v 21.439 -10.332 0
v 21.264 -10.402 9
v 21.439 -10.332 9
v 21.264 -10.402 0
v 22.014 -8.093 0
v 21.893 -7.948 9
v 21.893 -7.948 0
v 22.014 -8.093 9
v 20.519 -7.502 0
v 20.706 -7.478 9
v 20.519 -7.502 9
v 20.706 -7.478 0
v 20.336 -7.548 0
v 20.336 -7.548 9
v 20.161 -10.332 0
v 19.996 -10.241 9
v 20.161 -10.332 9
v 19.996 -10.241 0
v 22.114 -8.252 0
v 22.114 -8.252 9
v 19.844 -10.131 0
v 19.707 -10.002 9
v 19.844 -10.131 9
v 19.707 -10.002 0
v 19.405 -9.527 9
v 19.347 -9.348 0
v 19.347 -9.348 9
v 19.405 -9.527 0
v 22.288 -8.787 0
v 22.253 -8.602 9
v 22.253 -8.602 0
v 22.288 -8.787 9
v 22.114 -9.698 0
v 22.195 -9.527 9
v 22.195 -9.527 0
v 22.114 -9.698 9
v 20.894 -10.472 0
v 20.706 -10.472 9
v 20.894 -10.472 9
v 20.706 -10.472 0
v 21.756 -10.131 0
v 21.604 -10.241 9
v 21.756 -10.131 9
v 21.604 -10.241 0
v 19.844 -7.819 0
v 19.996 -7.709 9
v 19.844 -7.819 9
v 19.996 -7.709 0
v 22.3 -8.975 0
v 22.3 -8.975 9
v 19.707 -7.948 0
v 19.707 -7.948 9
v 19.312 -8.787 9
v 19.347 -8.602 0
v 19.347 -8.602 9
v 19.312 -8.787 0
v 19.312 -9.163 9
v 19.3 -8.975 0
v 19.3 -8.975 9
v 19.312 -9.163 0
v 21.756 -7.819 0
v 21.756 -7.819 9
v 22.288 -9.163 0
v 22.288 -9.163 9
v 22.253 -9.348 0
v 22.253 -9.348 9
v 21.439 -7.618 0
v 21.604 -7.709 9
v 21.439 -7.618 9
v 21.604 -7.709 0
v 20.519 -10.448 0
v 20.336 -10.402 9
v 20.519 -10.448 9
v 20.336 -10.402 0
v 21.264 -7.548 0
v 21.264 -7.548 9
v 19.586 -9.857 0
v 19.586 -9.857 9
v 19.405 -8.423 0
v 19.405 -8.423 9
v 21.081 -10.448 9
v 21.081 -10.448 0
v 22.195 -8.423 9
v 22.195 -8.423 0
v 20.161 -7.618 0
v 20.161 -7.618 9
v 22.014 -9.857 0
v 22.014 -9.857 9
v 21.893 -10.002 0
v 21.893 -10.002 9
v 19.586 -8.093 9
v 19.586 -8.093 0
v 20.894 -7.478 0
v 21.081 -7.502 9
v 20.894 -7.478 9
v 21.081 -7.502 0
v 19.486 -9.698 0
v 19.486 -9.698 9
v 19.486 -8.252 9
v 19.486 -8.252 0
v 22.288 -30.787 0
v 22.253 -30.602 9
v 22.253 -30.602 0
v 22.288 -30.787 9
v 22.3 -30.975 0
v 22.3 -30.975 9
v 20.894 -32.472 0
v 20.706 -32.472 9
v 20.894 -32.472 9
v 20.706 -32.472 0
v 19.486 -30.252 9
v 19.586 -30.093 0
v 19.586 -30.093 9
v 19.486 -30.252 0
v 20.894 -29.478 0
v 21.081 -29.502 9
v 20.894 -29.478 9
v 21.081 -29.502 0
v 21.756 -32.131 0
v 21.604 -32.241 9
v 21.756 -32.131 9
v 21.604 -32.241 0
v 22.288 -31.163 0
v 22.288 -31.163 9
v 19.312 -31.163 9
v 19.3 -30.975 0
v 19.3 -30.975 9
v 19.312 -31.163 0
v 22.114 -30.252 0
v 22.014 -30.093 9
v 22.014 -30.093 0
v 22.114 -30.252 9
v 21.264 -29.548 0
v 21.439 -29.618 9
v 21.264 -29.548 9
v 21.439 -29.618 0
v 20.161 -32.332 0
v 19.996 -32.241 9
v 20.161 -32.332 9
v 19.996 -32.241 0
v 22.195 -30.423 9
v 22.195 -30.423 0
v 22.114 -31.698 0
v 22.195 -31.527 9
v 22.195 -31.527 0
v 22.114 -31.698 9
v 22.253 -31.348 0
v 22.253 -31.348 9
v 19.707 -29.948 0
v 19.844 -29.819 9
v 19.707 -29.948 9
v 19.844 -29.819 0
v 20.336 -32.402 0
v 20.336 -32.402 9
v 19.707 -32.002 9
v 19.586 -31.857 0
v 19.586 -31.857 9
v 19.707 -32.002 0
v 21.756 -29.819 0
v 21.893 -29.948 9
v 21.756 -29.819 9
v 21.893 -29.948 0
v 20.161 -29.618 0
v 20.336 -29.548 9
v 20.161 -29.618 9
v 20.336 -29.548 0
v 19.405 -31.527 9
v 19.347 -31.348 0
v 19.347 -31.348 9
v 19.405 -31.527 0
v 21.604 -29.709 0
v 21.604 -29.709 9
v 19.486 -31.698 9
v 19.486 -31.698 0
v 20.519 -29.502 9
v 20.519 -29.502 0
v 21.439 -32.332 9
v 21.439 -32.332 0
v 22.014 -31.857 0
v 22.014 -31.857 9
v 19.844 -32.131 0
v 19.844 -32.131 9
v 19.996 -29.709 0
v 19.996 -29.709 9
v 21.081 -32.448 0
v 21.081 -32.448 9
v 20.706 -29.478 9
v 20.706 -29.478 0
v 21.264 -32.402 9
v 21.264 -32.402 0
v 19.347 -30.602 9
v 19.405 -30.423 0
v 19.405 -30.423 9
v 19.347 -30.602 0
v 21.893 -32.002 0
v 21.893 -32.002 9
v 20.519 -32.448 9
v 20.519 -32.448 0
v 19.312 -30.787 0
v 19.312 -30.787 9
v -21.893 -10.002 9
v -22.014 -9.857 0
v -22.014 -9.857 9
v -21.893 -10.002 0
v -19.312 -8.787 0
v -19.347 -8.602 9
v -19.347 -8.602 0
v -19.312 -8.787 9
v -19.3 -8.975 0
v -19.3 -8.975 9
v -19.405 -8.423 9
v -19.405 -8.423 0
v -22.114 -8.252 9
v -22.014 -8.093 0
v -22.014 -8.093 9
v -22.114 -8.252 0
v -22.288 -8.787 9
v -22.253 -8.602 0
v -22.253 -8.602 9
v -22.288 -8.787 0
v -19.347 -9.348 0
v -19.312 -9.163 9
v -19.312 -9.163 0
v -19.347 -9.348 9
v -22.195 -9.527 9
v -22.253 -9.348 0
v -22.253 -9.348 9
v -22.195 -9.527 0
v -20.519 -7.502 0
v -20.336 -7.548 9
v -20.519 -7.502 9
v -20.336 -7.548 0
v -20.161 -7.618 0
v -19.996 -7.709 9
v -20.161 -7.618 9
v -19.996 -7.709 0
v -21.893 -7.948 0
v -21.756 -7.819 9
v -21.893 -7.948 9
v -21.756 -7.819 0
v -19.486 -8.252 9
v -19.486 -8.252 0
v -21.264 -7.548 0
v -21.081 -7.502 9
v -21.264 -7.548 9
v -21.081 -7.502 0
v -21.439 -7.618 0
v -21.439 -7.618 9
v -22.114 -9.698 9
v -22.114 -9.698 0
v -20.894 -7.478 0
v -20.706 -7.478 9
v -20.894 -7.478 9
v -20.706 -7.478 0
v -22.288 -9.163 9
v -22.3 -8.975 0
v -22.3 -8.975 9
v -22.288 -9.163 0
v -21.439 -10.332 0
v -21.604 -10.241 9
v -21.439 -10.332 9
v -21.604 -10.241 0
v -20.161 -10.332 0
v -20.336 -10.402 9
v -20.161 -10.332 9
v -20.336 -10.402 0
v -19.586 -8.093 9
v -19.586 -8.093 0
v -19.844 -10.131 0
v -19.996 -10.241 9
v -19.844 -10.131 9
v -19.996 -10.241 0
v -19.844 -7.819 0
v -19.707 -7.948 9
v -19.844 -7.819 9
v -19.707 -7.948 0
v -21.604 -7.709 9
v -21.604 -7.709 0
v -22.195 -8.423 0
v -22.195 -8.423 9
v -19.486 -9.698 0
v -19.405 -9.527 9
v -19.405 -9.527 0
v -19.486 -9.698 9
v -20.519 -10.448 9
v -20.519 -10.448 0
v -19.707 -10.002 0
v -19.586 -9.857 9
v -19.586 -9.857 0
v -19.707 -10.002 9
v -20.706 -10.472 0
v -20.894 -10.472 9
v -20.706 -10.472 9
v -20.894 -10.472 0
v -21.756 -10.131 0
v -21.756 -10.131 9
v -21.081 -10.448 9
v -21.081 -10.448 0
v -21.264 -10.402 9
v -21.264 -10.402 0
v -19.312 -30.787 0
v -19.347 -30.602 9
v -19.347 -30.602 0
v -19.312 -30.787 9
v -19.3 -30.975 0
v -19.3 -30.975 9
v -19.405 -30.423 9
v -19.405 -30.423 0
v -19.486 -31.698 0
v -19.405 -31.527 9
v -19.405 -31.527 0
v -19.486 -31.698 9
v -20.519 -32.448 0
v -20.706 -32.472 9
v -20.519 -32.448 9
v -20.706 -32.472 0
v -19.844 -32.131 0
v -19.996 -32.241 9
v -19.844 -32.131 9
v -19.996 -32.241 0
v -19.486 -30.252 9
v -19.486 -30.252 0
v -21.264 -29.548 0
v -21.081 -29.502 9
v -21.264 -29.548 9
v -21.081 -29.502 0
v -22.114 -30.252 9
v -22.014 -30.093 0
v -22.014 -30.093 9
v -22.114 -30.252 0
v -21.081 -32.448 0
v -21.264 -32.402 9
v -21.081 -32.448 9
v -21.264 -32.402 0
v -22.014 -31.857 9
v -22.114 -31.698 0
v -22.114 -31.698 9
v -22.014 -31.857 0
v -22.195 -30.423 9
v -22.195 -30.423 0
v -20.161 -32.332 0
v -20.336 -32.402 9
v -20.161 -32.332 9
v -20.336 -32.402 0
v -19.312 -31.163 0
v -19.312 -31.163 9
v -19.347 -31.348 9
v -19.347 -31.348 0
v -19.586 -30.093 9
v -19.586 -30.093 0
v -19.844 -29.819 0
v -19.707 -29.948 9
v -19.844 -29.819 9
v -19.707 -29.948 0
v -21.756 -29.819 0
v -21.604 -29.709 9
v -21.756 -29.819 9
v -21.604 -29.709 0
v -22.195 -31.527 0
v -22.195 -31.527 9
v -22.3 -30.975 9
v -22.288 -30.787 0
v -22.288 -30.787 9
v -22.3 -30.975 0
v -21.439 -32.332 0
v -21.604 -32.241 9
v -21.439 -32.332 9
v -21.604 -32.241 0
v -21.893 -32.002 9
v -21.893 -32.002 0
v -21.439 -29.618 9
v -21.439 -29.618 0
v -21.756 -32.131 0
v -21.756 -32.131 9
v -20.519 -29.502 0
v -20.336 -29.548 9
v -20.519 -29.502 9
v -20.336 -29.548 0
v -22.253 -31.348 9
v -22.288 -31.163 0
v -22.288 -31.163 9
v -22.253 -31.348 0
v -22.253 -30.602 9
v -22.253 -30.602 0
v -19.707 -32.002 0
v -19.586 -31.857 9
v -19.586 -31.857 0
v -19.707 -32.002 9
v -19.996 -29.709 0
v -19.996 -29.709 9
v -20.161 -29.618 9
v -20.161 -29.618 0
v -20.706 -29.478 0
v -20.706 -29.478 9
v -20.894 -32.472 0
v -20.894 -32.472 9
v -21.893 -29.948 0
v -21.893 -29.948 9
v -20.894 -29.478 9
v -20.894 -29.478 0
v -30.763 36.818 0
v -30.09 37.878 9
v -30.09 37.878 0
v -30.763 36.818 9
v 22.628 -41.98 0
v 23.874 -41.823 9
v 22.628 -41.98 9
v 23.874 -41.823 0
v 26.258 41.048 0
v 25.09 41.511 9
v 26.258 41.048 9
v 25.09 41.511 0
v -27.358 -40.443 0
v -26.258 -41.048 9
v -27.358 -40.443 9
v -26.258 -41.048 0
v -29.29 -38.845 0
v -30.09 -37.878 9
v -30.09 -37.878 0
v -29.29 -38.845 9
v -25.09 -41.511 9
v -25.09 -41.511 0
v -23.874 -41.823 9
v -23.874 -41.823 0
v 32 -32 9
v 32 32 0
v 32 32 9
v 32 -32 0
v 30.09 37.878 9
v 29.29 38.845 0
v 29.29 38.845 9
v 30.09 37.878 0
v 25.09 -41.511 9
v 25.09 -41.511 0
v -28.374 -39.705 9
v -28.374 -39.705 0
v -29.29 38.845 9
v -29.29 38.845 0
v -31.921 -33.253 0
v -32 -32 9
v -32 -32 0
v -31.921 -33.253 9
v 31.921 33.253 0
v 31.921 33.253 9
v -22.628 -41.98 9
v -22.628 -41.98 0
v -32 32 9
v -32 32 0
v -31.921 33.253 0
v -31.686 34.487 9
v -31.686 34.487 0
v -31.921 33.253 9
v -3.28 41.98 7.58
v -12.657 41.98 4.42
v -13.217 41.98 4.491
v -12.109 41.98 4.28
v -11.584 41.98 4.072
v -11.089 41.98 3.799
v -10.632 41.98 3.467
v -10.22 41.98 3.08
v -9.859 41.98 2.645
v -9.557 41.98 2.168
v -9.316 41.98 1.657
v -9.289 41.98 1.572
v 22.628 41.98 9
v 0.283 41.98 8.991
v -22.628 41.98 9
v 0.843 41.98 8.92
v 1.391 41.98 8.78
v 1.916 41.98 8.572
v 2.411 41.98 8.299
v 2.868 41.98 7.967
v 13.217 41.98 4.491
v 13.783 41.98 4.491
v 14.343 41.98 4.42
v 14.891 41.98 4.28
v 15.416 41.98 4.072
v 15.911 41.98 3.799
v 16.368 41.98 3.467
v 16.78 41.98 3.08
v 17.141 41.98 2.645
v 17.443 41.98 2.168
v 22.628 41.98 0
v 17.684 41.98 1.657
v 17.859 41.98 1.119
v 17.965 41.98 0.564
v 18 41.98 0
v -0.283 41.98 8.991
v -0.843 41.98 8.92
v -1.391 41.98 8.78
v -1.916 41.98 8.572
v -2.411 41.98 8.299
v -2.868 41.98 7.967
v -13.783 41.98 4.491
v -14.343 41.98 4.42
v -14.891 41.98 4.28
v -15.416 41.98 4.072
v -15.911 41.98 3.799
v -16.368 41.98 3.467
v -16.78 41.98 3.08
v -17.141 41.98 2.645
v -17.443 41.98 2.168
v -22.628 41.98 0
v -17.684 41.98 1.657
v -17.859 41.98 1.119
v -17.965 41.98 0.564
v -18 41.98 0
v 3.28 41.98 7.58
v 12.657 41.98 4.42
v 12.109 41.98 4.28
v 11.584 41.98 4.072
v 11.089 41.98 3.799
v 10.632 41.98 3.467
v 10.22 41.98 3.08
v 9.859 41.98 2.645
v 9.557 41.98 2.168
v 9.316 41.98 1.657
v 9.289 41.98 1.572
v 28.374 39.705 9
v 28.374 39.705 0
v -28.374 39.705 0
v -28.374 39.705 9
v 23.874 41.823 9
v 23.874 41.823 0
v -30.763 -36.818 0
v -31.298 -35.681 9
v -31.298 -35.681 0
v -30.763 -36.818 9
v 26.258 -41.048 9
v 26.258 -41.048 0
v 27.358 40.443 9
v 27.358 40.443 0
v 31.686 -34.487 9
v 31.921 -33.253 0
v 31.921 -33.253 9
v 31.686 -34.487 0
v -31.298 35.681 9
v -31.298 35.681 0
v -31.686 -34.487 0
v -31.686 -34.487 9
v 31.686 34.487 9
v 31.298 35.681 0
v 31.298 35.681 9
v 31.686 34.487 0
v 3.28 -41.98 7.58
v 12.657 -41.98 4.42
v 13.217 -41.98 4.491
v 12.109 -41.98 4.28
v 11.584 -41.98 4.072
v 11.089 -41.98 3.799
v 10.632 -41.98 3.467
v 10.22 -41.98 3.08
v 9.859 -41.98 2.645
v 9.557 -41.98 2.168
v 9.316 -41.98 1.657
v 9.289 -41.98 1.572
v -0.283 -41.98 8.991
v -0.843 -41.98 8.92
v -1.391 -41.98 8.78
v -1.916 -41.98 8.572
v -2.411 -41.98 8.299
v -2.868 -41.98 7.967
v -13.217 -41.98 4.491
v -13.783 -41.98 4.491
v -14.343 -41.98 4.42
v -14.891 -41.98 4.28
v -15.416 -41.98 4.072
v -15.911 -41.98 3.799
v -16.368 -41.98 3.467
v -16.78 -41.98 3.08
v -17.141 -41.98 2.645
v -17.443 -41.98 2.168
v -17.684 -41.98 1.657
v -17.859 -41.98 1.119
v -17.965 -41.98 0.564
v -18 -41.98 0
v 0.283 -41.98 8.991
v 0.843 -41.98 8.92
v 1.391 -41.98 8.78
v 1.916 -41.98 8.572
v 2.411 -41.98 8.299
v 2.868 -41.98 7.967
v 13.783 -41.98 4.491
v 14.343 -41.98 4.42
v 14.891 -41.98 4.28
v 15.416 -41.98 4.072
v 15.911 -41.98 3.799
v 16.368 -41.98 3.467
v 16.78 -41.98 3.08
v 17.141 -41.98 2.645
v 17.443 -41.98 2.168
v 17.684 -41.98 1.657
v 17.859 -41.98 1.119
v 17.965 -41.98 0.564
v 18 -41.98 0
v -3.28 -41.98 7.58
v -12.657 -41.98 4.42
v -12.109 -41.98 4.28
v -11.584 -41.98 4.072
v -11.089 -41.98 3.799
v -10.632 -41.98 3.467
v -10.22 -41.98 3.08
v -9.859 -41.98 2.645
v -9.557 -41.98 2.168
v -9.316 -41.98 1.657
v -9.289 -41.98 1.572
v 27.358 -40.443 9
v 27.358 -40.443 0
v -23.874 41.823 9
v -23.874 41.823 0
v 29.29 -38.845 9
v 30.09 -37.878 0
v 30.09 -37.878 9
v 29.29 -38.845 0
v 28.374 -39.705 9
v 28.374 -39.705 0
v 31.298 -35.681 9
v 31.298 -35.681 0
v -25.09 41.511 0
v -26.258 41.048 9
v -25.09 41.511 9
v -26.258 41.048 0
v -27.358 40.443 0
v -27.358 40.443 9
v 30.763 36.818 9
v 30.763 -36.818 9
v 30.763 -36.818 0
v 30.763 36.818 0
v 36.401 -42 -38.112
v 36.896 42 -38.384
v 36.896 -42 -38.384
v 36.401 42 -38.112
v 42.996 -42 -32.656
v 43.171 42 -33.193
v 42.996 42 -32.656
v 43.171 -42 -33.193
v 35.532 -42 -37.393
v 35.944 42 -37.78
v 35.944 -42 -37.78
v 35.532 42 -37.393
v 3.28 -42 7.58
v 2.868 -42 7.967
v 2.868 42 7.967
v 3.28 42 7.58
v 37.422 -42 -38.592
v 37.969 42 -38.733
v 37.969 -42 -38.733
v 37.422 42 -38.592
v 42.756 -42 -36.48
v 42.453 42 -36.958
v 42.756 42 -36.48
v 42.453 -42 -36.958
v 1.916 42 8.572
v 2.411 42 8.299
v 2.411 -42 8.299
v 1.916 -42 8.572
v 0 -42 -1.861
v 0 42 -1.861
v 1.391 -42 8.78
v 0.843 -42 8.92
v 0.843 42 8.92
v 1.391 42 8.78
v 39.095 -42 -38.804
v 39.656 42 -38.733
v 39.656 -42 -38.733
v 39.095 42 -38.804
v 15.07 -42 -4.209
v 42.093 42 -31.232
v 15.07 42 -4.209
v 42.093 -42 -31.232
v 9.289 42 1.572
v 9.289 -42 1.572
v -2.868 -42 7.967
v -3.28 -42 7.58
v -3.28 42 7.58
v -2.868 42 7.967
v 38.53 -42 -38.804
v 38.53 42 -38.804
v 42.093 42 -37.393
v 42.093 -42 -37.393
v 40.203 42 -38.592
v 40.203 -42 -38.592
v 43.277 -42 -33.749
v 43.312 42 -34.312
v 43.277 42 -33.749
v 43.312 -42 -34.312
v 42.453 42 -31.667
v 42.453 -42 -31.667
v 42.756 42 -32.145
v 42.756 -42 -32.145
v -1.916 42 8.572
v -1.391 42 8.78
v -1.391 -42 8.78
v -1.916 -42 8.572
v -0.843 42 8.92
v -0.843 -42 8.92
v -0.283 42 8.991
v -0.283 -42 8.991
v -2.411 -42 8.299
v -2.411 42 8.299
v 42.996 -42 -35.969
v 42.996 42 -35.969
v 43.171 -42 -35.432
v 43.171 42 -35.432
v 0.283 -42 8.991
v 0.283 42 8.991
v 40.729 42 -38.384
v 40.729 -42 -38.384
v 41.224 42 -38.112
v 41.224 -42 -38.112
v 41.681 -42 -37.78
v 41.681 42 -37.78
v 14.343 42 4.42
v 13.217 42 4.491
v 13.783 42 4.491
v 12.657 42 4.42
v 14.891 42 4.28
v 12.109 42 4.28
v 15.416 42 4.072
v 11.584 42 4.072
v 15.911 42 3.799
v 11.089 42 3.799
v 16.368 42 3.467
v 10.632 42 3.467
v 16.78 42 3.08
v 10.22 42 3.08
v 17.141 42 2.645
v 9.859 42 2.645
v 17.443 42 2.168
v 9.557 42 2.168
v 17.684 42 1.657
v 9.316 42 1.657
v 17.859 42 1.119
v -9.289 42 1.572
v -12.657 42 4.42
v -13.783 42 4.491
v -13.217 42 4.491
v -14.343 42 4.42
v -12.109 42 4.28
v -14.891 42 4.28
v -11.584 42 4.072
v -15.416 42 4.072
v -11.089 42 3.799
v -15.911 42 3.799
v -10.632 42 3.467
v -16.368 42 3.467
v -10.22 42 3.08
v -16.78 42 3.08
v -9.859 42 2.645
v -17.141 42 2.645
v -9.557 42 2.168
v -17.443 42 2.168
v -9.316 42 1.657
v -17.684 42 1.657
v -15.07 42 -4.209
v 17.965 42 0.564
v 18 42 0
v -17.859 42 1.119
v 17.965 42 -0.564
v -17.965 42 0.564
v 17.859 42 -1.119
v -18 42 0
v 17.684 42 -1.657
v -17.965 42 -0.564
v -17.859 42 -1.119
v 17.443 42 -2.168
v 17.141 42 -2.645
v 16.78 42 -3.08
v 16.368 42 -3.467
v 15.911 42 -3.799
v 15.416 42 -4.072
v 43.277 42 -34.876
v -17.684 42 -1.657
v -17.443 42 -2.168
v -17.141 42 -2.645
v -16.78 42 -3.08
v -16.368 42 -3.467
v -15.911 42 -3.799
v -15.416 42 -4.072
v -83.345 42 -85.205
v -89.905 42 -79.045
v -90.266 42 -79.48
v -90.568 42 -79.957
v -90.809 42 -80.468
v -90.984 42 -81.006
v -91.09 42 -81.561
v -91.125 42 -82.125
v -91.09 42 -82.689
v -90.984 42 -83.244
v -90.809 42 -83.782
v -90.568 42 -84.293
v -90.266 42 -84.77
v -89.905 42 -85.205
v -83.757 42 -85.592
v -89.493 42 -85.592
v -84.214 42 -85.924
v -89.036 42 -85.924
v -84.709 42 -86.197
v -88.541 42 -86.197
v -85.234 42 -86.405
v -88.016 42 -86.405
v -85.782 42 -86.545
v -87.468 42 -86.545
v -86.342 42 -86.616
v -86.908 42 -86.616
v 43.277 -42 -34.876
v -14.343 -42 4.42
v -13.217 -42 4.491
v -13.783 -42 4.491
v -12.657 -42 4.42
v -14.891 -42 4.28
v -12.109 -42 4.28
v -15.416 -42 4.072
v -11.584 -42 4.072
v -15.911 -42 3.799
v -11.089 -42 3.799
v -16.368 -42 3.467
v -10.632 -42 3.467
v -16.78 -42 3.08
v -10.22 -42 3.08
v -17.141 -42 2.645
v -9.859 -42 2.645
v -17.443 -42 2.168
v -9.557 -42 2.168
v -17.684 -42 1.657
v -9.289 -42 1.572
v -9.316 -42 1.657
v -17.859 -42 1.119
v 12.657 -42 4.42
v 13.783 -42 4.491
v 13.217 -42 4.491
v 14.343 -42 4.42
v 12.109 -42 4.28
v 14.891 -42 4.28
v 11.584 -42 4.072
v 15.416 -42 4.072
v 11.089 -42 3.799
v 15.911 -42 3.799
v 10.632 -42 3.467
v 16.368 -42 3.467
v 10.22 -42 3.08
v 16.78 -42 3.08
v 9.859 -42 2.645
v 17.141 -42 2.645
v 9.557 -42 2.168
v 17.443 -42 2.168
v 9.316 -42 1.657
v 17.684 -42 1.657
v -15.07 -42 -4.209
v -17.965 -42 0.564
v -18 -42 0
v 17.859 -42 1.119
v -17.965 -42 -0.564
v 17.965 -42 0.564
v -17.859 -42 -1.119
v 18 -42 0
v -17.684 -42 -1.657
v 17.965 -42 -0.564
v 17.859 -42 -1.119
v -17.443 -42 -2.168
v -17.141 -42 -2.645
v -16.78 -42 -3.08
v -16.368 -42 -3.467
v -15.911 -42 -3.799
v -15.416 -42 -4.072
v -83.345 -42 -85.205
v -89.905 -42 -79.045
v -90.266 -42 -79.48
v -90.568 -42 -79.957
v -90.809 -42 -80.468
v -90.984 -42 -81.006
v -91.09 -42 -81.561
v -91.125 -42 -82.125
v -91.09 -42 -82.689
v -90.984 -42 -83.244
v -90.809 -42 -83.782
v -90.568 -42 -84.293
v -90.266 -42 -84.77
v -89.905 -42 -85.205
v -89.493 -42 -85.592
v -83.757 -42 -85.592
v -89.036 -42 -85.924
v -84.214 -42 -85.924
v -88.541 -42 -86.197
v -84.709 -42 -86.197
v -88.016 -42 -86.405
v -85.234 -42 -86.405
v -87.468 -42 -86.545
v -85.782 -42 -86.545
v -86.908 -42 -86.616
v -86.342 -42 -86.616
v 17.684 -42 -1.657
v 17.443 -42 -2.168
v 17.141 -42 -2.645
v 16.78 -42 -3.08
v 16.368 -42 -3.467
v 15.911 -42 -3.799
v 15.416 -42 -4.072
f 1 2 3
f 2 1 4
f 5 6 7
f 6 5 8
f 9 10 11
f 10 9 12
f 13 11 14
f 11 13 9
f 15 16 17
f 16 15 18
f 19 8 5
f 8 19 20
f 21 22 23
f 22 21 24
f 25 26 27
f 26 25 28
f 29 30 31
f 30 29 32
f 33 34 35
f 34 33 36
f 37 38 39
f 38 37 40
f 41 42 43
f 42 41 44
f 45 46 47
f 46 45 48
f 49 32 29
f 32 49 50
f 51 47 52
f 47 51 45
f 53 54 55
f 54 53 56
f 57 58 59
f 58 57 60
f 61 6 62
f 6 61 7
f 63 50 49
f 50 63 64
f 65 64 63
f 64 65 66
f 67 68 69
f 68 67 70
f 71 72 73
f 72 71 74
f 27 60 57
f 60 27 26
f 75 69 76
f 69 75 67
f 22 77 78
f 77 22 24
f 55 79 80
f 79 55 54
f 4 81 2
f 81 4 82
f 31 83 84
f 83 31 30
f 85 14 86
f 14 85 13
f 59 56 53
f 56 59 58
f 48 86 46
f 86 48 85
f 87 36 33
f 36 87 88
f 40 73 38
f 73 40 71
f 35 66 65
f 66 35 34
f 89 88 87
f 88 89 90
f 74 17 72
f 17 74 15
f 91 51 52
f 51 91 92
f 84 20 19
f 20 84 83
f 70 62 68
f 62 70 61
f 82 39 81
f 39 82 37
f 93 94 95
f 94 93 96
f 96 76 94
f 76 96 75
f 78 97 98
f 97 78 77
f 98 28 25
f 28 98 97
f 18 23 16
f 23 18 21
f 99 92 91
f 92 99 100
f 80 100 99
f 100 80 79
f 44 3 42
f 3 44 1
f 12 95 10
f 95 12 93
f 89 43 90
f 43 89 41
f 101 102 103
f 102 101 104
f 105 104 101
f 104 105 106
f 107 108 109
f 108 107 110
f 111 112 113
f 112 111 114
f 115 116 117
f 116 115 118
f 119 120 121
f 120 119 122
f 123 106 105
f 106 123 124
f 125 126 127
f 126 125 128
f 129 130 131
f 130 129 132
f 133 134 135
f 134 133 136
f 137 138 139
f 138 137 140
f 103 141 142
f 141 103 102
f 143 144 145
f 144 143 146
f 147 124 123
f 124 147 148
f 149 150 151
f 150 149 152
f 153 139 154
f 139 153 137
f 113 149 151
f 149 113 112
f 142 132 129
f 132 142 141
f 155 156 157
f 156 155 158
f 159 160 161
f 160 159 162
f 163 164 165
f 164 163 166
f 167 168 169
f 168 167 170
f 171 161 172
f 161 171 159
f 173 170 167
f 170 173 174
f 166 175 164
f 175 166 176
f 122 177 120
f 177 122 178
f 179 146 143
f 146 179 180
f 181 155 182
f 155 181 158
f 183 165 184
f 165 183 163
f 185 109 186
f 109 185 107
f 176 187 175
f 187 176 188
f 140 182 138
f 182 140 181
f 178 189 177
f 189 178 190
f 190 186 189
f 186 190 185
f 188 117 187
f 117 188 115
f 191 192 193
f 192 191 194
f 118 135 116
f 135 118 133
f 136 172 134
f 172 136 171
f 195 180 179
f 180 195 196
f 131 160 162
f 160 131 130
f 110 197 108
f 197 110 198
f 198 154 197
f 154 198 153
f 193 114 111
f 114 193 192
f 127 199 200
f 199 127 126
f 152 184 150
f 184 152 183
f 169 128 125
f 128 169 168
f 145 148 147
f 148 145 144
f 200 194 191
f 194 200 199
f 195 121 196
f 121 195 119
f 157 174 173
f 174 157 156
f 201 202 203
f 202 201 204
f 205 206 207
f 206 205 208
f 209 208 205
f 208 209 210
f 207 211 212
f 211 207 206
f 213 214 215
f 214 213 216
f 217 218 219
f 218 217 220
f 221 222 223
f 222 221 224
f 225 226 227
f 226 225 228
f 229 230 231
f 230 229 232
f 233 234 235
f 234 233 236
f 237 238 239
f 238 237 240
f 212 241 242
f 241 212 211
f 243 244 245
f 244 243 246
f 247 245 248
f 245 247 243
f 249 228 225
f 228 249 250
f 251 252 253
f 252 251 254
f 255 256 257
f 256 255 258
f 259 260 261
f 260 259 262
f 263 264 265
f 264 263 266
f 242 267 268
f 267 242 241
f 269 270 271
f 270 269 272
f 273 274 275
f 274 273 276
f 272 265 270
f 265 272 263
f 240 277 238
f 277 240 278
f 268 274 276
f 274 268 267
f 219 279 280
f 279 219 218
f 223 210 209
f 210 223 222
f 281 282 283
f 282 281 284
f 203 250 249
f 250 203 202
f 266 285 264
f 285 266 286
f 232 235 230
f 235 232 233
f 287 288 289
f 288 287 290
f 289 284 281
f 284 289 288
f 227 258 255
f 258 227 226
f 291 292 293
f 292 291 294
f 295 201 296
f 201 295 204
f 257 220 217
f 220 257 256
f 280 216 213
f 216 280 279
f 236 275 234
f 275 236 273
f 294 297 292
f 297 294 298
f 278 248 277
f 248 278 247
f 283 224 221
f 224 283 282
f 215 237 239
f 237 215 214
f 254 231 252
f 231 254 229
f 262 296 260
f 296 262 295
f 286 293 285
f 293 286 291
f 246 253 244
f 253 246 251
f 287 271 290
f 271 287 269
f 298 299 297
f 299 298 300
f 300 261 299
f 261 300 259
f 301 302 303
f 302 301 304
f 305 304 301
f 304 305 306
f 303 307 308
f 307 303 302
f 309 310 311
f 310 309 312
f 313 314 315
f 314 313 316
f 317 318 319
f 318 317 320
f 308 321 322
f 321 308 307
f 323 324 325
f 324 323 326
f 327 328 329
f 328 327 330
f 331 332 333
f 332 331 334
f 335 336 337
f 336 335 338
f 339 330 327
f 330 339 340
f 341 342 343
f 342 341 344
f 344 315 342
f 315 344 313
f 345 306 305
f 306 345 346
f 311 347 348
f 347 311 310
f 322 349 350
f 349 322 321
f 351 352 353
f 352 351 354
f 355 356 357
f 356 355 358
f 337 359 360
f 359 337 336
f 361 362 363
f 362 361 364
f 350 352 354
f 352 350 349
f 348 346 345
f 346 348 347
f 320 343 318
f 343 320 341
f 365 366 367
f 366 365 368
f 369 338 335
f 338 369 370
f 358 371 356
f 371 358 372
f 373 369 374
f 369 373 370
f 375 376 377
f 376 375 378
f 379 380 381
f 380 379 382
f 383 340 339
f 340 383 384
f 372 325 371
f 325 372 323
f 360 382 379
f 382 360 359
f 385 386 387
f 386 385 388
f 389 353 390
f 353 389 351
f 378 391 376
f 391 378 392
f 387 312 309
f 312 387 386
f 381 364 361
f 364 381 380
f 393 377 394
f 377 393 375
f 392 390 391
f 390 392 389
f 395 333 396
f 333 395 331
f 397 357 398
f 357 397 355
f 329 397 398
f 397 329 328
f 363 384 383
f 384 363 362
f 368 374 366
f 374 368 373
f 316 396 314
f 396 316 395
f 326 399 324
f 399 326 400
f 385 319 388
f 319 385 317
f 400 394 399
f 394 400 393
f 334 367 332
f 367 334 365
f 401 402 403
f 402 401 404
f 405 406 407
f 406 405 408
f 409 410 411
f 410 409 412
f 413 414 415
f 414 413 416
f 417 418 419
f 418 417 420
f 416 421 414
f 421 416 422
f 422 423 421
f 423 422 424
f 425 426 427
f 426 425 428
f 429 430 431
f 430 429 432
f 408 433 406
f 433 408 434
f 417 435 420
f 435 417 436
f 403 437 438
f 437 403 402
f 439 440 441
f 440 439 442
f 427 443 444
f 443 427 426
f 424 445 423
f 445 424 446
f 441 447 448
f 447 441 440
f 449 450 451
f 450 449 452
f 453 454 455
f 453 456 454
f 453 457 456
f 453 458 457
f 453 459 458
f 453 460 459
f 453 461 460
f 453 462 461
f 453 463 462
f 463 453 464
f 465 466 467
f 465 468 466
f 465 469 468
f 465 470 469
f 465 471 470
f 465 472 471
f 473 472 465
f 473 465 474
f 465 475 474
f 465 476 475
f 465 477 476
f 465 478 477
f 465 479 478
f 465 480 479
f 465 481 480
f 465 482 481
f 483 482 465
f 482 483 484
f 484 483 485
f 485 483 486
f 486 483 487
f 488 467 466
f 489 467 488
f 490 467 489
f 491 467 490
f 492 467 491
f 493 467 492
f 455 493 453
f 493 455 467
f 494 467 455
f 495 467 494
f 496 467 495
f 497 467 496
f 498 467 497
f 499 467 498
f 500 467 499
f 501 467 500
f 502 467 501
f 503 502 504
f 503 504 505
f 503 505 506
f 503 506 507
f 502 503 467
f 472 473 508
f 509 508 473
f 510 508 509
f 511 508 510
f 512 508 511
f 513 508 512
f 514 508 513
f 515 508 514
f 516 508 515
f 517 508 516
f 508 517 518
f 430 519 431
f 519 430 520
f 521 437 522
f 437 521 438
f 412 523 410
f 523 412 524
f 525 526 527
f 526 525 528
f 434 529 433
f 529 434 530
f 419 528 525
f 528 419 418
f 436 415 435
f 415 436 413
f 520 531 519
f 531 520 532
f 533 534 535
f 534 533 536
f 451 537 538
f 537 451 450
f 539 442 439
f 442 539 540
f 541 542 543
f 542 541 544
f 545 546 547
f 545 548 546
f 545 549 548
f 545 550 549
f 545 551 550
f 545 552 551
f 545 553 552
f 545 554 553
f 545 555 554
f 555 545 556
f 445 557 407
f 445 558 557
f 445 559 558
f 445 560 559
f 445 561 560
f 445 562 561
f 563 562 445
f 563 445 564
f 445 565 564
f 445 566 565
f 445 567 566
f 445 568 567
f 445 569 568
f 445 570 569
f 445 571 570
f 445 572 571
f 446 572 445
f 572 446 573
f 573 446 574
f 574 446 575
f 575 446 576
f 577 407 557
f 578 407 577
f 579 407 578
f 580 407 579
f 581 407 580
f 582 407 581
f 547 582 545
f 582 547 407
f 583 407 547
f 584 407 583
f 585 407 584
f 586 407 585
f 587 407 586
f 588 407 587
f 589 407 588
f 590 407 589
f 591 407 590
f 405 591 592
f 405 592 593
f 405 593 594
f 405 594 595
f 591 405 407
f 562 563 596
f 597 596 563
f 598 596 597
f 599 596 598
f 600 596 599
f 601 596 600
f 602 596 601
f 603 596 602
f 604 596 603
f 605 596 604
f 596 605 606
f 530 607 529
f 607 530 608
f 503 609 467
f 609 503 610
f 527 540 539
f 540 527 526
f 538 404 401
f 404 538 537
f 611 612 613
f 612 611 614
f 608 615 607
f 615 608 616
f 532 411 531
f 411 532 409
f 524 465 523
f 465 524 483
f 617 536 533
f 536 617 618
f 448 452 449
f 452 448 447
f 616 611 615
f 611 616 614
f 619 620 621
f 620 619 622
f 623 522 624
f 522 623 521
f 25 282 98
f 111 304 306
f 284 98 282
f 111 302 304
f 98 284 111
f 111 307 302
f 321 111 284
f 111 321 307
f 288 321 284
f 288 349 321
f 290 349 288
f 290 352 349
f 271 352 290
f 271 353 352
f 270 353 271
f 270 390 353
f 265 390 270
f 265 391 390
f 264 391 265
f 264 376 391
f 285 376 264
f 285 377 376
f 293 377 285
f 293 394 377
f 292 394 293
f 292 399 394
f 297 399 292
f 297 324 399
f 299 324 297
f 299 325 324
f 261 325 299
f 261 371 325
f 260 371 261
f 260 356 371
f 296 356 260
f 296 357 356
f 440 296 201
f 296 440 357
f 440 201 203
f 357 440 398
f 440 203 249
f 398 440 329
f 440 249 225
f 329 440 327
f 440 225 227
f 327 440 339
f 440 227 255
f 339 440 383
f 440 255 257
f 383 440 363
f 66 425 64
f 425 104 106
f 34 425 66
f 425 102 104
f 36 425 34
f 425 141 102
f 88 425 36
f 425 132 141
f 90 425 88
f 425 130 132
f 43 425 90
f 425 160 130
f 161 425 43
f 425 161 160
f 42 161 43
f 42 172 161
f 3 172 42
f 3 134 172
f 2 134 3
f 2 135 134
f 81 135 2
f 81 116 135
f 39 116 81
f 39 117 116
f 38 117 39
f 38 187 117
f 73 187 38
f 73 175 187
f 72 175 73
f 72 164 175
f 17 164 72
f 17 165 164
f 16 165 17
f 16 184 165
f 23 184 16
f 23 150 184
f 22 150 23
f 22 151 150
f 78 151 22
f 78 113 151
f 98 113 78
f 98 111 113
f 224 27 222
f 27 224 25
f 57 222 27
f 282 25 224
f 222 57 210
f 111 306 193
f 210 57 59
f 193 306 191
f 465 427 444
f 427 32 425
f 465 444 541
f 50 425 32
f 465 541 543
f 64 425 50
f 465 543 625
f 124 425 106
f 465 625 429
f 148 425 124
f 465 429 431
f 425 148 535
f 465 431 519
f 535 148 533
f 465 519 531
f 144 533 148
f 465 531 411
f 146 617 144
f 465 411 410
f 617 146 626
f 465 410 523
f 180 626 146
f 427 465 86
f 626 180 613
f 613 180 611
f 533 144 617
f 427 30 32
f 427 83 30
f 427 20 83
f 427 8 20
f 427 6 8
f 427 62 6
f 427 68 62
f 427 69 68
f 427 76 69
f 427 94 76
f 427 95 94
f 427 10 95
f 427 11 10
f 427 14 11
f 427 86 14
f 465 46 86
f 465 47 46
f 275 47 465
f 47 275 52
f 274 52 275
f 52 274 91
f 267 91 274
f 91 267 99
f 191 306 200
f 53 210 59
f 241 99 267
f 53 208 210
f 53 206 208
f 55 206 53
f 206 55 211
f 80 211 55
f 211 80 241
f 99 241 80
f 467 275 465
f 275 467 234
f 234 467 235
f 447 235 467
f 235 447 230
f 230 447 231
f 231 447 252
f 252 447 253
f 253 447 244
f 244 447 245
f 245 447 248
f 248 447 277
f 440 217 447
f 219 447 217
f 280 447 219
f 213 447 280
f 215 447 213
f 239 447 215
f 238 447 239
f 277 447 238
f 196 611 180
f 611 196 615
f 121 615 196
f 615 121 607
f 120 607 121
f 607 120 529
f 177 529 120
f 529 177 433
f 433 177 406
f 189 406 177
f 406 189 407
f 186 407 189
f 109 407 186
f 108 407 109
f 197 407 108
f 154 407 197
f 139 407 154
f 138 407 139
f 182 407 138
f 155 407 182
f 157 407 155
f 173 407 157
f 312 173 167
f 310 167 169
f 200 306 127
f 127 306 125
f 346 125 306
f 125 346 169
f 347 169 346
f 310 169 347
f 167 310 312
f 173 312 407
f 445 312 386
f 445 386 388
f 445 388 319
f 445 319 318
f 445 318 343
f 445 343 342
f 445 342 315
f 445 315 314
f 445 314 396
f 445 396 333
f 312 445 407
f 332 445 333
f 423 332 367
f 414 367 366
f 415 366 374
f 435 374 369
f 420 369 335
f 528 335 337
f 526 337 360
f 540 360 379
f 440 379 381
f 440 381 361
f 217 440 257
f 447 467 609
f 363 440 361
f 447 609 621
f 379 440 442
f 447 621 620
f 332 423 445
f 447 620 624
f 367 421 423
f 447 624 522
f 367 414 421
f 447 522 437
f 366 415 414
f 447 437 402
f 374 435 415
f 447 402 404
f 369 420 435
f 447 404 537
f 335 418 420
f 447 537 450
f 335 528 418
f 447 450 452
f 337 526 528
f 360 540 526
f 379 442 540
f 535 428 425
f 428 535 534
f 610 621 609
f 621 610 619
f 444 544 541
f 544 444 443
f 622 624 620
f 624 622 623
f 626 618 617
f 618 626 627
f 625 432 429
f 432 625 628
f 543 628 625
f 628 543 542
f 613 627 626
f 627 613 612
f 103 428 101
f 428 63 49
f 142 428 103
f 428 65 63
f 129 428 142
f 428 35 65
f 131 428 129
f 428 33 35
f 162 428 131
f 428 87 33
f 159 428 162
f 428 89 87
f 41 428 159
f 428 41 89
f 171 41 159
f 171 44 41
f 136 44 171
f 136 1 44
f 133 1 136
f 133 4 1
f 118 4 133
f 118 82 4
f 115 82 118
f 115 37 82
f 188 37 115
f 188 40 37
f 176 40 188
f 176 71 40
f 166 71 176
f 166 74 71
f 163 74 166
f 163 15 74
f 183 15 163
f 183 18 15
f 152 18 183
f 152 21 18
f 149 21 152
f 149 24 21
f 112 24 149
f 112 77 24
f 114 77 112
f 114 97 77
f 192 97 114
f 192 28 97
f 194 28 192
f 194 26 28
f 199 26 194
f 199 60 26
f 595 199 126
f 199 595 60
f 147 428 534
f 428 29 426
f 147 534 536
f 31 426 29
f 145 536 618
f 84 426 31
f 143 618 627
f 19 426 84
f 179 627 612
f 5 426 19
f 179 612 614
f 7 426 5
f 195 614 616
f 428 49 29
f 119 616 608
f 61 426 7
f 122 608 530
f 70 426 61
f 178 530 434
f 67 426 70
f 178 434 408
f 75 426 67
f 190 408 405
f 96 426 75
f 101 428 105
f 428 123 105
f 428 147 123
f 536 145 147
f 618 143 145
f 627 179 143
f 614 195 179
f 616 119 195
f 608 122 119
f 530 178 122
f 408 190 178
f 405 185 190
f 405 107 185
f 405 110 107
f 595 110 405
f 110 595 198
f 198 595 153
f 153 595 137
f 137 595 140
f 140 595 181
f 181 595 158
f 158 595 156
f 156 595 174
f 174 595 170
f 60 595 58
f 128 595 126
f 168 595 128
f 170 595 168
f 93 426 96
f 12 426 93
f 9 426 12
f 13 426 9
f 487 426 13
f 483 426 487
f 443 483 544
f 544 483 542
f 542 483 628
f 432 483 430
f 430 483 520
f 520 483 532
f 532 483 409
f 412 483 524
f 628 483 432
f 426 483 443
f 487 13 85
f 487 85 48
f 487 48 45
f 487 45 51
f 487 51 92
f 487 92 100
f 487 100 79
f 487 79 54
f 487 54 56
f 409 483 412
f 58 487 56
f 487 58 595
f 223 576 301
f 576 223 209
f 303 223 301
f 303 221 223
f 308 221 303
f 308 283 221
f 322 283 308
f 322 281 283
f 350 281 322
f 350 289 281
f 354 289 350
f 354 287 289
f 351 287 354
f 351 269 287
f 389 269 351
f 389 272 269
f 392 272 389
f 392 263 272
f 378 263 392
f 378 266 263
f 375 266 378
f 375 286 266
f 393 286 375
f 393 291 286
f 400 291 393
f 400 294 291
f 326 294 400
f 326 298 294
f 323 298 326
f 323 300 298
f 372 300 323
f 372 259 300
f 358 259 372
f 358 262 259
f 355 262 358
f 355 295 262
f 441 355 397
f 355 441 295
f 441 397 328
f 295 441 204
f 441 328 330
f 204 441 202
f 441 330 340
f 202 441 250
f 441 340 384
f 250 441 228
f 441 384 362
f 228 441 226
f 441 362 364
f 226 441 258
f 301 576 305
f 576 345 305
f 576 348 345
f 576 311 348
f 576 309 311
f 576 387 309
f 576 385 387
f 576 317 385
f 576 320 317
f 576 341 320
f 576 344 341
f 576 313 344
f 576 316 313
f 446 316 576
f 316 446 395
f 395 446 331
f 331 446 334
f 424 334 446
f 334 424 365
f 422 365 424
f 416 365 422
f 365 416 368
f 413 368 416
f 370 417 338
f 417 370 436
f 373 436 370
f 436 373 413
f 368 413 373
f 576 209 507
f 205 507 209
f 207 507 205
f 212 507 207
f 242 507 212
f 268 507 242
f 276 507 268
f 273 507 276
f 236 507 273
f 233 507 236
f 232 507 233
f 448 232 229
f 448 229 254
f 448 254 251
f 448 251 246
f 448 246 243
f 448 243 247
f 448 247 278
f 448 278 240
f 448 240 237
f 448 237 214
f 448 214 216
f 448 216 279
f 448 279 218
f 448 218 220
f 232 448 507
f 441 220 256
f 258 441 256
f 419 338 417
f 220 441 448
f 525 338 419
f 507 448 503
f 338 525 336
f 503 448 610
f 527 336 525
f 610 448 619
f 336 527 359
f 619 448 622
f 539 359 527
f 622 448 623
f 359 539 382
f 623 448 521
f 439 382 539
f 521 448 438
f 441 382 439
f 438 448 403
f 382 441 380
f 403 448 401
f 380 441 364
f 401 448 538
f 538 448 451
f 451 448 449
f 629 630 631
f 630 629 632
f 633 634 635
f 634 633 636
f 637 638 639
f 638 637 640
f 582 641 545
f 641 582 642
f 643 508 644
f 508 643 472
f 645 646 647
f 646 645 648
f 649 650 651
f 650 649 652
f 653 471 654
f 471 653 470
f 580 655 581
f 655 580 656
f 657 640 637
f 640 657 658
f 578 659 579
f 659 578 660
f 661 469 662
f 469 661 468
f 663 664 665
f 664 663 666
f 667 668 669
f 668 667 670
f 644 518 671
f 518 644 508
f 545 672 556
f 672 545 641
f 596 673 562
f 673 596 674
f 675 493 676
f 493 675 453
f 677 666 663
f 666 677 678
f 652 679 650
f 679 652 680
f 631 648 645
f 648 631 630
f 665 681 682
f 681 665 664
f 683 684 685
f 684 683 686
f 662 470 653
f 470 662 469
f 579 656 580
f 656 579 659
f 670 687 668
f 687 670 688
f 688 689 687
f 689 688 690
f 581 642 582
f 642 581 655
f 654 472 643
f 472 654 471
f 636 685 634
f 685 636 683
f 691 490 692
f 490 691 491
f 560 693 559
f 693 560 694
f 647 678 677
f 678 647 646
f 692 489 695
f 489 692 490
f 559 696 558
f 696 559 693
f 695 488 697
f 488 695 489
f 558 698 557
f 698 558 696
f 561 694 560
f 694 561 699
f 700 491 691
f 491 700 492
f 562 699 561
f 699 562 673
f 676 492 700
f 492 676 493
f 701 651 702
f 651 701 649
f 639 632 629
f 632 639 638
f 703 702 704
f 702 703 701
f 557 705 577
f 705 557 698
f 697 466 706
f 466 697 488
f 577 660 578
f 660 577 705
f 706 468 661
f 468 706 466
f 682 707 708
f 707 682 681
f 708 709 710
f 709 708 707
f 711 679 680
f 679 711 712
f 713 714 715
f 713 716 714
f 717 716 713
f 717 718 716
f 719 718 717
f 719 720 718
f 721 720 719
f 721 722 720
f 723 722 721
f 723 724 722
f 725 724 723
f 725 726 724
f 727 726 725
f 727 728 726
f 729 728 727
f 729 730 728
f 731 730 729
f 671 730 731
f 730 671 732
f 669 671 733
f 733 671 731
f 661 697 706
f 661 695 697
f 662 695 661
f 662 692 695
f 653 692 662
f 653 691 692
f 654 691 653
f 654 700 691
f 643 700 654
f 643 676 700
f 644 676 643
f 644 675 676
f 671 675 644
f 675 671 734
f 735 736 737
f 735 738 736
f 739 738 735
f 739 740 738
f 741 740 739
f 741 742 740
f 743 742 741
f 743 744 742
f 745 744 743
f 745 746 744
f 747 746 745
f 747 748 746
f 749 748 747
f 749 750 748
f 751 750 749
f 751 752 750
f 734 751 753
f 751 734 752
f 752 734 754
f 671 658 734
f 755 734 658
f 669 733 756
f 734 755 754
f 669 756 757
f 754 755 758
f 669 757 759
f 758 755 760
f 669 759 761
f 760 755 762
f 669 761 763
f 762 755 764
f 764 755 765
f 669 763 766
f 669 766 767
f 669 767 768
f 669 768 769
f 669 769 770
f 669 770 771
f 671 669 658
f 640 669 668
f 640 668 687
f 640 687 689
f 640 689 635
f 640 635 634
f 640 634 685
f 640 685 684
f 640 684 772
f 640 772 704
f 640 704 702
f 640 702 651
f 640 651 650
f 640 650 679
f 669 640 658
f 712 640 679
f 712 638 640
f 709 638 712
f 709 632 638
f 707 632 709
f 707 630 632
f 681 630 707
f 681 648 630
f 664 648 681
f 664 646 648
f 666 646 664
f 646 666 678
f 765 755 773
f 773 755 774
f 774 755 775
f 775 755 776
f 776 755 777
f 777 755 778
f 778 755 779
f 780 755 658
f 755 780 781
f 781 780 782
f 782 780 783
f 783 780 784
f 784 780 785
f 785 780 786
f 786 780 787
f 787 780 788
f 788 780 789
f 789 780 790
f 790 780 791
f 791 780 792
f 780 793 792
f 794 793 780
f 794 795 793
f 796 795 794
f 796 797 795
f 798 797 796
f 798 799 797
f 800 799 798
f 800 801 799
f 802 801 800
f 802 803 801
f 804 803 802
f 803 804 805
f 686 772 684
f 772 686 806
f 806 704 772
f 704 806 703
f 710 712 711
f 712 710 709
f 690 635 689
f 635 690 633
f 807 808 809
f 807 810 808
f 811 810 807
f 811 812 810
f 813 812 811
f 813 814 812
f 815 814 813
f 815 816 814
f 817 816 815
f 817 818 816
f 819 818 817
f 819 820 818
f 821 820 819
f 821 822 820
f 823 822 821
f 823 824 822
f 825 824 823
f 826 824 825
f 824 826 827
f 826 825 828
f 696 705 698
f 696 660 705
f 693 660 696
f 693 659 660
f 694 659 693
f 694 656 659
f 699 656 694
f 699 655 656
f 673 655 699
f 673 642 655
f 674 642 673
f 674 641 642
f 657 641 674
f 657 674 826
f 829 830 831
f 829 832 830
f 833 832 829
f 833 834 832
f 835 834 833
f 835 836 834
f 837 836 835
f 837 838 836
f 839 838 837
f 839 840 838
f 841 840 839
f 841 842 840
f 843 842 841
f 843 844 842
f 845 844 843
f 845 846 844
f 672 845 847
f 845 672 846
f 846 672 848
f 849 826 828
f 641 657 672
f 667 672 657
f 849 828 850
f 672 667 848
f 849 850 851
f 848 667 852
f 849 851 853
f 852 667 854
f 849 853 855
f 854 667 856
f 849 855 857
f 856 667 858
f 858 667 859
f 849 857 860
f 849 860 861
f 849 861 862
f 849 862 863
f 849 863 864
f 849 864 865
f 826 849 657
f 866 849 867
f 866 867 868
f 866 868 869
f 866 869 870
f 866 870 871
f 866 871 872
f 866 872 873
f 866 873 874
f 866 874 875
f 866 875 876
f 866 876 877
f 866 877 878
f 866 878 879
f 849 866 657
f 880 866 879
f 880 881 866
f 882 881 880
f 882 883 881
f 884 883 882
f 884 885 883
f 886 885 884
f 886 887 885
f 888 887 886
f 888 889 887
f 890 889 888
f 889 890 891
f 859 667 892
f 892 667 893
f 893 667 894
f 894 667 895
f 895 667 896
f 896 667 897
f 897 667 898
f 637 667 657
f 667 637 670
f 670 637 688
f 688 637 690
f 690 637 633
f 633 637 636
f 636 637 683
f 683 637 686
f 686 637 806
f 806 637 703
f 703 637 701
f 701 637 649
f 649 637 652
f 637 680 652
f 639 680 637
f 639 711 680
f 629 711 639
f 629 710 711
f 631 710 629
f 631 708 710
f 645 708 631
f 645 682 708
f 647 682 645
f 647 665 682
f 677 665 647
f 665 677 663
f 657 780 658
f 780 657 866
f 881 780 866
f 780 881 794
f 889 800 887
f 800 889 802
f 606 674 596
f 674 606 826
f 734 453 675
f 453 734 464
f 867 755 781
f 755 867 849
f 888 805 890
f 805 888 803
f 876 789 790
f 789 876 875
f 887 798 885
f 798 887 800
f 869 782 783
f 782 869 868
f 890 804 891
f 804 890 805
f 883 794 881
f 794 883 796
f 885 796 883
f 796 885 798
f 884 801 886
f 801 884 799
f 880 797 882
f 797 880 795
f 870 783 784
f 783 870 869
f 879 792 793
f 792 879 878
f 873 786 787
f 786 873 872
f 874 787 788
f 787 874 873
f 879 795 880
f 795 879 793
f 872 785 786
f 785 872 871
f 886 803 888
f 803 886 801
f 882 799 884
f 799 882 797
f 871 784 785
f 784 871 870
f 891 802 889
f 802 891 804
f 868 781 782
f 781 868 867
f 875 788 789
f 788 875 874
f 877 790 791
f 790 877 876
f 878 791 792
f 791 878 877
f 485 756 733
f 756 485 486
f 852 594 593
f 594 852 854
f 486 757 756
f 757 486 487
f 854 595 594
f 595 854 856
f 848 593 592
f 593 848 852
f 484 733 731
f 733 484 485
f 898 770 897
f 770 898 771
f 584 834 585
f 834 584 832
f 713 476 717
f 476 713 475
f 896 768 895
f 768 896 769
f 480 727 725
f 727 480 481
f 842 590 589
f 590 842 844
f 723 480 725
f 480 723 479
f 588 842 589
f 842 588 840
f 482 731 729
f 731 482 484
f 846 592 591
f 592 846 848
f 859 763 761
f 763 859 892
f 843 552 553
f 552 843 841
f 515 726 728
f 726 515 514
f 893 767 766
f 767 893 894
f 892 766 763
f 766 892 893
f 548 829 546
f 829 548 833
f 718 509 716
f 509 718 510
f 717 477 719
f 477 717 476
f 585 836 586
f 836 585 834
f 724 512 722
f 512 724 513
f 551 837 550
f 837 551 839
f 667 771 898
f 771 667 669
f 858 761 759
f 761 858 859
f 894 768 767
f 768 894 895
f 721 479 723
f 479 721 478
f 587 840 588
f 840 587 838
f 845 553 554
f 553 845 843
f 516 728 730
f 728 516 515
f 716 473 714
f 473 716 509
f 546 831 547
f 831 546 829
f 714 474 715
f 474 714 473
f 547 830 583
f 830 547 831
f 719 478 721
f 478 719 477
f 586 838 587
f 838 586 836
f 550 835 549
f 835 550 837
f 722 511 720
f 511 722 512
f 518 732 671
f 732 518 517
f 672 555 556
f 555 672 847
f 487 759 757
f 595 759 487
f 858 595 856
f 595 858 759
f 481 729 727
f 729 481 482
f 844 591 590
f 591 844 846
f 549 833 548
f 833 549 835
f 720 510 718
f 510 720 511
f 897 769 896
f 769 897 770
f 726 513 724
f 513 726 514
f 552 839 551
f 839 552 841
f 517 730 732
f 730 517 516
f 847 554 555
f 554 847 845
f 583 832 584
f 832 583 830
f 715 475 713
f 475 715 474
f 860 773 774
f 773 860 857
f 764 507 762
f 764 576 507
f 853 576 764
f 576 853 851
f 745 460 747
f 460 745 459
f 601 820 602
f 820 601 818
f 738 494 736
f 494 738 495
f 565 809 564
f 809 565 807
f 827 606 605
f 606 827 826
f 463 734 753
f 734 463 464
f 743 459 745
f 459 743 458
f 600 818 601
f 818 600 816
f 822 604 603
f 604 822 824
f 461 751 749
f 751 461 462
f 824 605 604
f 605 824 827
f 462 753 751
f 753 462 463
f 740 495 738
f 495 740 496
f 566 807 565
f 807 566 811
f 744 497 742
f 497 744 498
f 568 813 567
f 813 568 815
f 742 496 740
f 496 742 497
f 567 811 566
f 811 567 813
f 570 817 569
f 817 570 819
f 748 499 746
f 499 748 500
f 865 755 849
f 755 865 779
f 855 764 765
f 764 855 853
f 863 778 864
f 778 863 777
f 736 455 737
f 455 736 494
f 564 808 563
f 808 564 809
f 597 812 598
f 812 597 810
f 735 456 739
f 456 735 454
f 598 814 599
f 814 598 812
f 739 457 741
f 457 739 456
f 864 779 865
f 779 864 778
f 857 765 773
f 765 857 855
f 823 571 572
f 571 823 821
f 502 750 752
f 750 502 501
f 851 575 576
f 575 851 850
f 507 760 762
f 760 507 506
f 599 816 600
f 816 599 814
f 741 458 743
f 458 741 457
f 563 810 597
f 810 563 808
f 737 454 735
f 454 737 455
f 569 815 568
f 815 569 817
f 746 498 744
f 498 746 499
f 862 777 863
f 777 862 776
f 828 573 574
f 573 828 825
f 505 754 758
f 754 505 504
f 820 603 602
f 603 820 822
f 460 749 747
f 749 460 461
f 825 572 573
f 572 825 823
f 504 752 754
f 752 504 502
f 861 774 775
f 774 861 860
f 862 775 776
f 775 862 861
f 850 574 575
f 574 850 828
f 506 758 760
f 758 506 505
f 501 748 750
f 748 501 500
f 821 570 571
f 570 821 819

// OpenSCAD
// file: myTools.scad
module tube (r = 0, d = 0, l = 0, 
            thick = 0, 
            bCentered = true, 
            taper_pct = 0, 
            circlip = false) // r=radius d=dia l=length 
{
    assert( r != 0 || d != 0, "specify one of radius or diameter");
    assert( l != 0 , "tube: need length 'l' to be non zero");
    assert( thick != 0, "wall thickness cannot be zero");

    punch = $preview ? .2 : 0; // stop funny view artifact

    dia = r ? r * 2 : d;

    od = ((thick > 0) ? dia + thick * 2 : dia);
    id = (thick > 0) ? dia             : dia  + thick *2; 

    
    
    if (thick > 0)
        echo ("tube\tMIN id = ", id, "od = ", od, "wall = ", thick, "center= ", bCentered);
    else
        echo ("tube\tMAX od = ", od, "id = ", id, "wall = ", thick, "center= ", bCentered);

    echo ("tube\tHeigth = ", l);
        
    if (taper_pct != 0)
    {
        echo ("tube\t*** OD expanded by ", taper_pct, "%, : bottom od = ", od * (1. +taper_pct/100), "top od = ", od);
    }
    
    assert(dia || dia < 0, "tube : missing r or d ");
    
    // if taper_pct specified, the base will always be closest to 0,0,0
    translate([ 0, 0, taper_pct == 0 ? 0: bCentered ? l/2:l  ])
    rotate([0, taper_pct == 0 ? 0 : 180, 0 ])

    difference()
    {
        // make a reese's cup
        {
            color("YELLOW", .3)
            linear_extrude(height= l, scale = 1 + taper_pct/100)
                difference()
                {
                    circle(d = od);
                    circle(d = .5);
                }
        }
    
     // hollow out reessed cup
     color("GREEN")
     translate([0, 0, -punch/2])
     linear_extrude(height= l+ punch*2, $fn=100)
     {
        circle(d = id);
        if (circlip) #square([1 + punch, od ]);
     }
    
    }
}
//==============================================================================
        
module abox (dims, 
            thick = 0, 
            bCentered = true, 
            round_out = 0, 
            round_in = 0, 
            bSolid = false,
            bHollow = false,
            elevator = 0)   // move bottom up by X
{
    punch = $preview ? .1 : 0; // stop funny view artifact
    
    assert(thick != 0, "Thick must be specified. +=outside dim, -= inside dims");
    
    
//    assert(dims.z > thick, "wall thickness too large for depth of box");

    wall2 = abs(thick) * 2; // 2 walls in each direction
    wall = wall2 / 2;
    
    // box either grows inward (thick < 0) or outward (thick > 0)  from dims
    fat = dims + [ wall2, wall2, wall];
    thin = dims - [ wall2, wall2, wall];
    
    offset = (thick > 0 && bCentered == false) ? wall : 0;
    
    //echo ("abox : adjusting x,y,z by ", offset, " to move origin from  center to 0,0,0");
    translate( [ bCentered ? 0 : dims.x /2 + offset, bCentered ? 0 : dims.y /2 + offset, bCentered ? 0 : dims.z /2 + offset/2]) 
    {
        if (thick > 0)
        {   
            // wall grows outwards from users dim
            echo ("making a box, MAX INSIDE dim = ", dims);
            echo ("   wall=", thick, " mm");
            echo ("   calc outside = ", fat, " mm");
        }
        else
        {
            // wall grows inward from users dime
            echo ("making a box, MAX OUTSIDE dim = ", dims);
            echo ("    wall=", thick, "mm");
            echo ("    calc inside = ", thin, " mm");
        }
        echo (" ");
        
        // linear extrude alway works in the positive x/y plane an goes upward.
        // after calc, re-center about 0,0,0 where a bCentered cube would be
        
        translate([ 0, 0, thick > 0  ? -fat.z/2 : -dims.z/2 ])
        difference()
        {
            echo ("round_out = ", round_out);

            // MAKE SOLID BOX --------------------------------------
            router_outside = round_out ? round_out : 0;
            x = thick > 0  ? fat.x - router_outside : dims.x - router_outside;
            y = thick > 0  ? fat.y - router_outside : dims.y - router_outside;


            // MAKE PUCHNED INSIDE
            // using 'offset' it will add r on all dimensions, then round., 
            // so now you have fatter perimeter than you started with :(
            //  but at least the corners are round.
            
            // Compensate by shrinking dimension by r, 
            // and then by calling offset, offset will then add it back

            //color("YELLOW", .2)

            // ready height 
            linear_extrude(thick > 0  ? fat.z : dims.z)
            if (round_out)
            {
                offset( r= round_out, $fn=30)
                square( [x - router_outside, y - router_outside], true);
            }
            else
            {
                // no rounding on outside dims.
                square( [x, y], true);
            }
            // time to punch out the inside if requested.
            if (bSolid == false)
            {
                hollow_offset = bHollow ? fat.z/2 + .2  : dims.z/2 +.2;
                // punching out inside. its either dims or thin.
                router_inside = round_in;
                echo ("round_in = ", router_inside);
                xi = thick > 0  ? dims.x  : thin.x;
                yi = thick > 0  ? dims.y : thin.y ;

                color("GREEN")

                // move 'punch' up if you need a bottom else zero (hollowed out)

                translate([ 0,0, bHollow ? -.1 : wall + elevator]) 
                linear_extrude(thick > 0  ? fat.z - wall  + hollow_offset : dims.z - wall + hollow_offset)
                //#linear_extrude(fat.z - wall  + hollow_offset)
                
                if (round_in) 
                {
                    offset( r= round_in, $fn=30)
                    square( [ xi - round_in*2, yi - round_in*2], true);
                }
                else
                    square( [ xi, yi], true);
            }
        }
    }
 }
//-----------------------------------------------------
module abox_punch (dims, 
            thick = 0, 
            bCentered = true, 
            round_out = 0, 
            round_in = 0, 
            bSolid = false,
            bHollow = false,
            elevator = 0)   // move bottom up by X
{
    // move bottom down by wall thickness to blow out bottom
    abox(dims, thick, bCentered,
         round_out, round_in, bSolid = false, 
         bHollow=true, elevator = -thick);
}



// 50x25x10 box walls grow inward (-2). on center origin midpoint
// rounded outside (default), sharp corner inside(default), bCentered about 0,0,0
//color("GREEN", .9)
//abox([50,25, 10], -2, true); 


// 50x25x10 box walls grow outward (+2). on center origin midpoint
// sharp outside corners, rounded inside corners. Sit on x,y plane
color("BLUE", .9)
abox([50,20, 10], +2, round_in=2, bCentered = false);  // 50x25x10 box inside dim origin has 0,0


// 50x25x10 box walls grow inward (-2). on center origin midpoint
// sharp corners inside and out. sits on x,y plane
color("GREY", .9)//
translate([ 55, 0, 0])      
abox([50,20, 10], +2, round_out=3, false);

color("PINK", .9)//
translate([ 55 * 2, 0, 0])      
abox_punch([50,20, 10], +2, round_out=3, false);

color("GREEN", .9)//
translate([ 55 * 3, 0, 0])      
abox_punch([50,20, 10], +2, round_in=2, false);


color("CYAN", .9)//
translate([ 55 * 4, 0, 0])      
abox_punch([50,20, 10], +2, round_in=2, round_out=2, false);


/*
color("GREEN", .9)//
translate([ 140, 10, -10])      
abox([86.66, 56.865, 5], 3, bHollow = true, bCentered = false); 
*/

/*
// 50x25x10 box walls grow inward (-2). on center origin midpoint
// round corners outside and SOLID
color("BLUE", .9)//
translate([ 55, 0, 0])      
abox([50,25, 10], +2, round_out=2, round_in=0, false, bSolid = true); // 50x25x10 box outside dim origin is 0,0
*/

//translate ([-30,-30, 0])
{
/*
    // tube outer dia  20, inner dia = (20 - 8)
    color("PINK")
    tube (d = 20, l = 20, thick = -8, bCentered = false);

    // tube, inner dia = (2* 10), outer dia = ((2*10) + 2) 
    color("PURPLE", .3)
    tube (r = 10, l = 20, thick = +2, bCentered= true);
*/
/*
    tube (d = 60, l = 20, thick = -6, bCentered = false);

    translate([0, 0, 50])
    tube (d = 60, l = 20, thick = -6, bCentered = false, taper_pct = 20, circlip = true);
    //color("GREEN")
    //tube (d = 20, l = 20, thick = -2, bCentered = false, taper = 10, circlip = true);
*/

}
// main file
use <myTools.scad>
$fn=50;

THICK = 9;
RADIUS=10;
DRILL = 3;

REAL = [61, 81, 20]; //real dims
TWEAK = [ 3,3,0 ];
BACKER = REAL + TWEAK;

EARS = [200, 81, THICK];
HOLES = [ 41.6, 22, 0];


OFFSET= (4.25 * 25.4)/2 - HOLES.y - 6 -6;

INSIDE = BACKER - [ RADIUS, RADIUS, 0 ];

module make_backplate()
{
    difference()
    {
        hull()
        {
            translate ([+BACKER.x/2 - RADIUS, +BACKER.y/2 - RADIUS, 0]) cylinder(r=RADIUS, h = THICK);
            translate ([+BACKER.x/2 - RADIUS, -BACKER.y/2 + RADIUS, 0]) cylinder(r=RADIUS, h = THICK);
            translate ([-BACKER.x/2 + RADIUS, +BACKER.y/2 - RADIUS, 0]) cylinder(r=RADIUS, h = THICK);
            translate ([-BACKER.x/2 + RADIUS, -BACKER.y/2 + RADIUS, 0]) cylinder(r=RADIUS, h = THICK);
        }

        #translate([ 0, -OFFSET, -THICK/2])
        {
            translate ([+HOLES.x/2, +HOLES.y/2, 0]) cylinder(d=DRILL, h = THICK*2);
            translate ([+HOLES.x/2, -HOLES.y/2, 0]) cylinder(d=DRILL, h = THICK*2);
            translate ([-HOLES.x/2, +HOLES.y/2, 0]) cylinder(d=DRILL, h = THICK*2);
            translate ([-HOLES.x/2, -HOLES.y/2, 0]) cylinder(d=DRILL, h = THICK*2);
        }
    }
}

module make_post()
{
    translate([0, BACKER.y/2, 0])
    rotate( [90, 0, 0 ])
    cylinder(d=THICK, BACKER.y);
}


LEN1= (2.125 * 22.5);

module make_ear(dist = LEN1, mirror = 1)
{
    hull()
    {
        make_post();
        translate([-(dist - THICK) * mirror, 0, -dist + THICK ])
        make_post();
    }
}

make_backplate();
translate([0, 0, THICK/2])
{
    make_ear(LEN1, -1);
    make_ear(LEN1*2, +1);
}

translate([THICK*1.5, 0, 0]) make_post();
translate([-THICK*1.5, 0, 0]) make_post();
